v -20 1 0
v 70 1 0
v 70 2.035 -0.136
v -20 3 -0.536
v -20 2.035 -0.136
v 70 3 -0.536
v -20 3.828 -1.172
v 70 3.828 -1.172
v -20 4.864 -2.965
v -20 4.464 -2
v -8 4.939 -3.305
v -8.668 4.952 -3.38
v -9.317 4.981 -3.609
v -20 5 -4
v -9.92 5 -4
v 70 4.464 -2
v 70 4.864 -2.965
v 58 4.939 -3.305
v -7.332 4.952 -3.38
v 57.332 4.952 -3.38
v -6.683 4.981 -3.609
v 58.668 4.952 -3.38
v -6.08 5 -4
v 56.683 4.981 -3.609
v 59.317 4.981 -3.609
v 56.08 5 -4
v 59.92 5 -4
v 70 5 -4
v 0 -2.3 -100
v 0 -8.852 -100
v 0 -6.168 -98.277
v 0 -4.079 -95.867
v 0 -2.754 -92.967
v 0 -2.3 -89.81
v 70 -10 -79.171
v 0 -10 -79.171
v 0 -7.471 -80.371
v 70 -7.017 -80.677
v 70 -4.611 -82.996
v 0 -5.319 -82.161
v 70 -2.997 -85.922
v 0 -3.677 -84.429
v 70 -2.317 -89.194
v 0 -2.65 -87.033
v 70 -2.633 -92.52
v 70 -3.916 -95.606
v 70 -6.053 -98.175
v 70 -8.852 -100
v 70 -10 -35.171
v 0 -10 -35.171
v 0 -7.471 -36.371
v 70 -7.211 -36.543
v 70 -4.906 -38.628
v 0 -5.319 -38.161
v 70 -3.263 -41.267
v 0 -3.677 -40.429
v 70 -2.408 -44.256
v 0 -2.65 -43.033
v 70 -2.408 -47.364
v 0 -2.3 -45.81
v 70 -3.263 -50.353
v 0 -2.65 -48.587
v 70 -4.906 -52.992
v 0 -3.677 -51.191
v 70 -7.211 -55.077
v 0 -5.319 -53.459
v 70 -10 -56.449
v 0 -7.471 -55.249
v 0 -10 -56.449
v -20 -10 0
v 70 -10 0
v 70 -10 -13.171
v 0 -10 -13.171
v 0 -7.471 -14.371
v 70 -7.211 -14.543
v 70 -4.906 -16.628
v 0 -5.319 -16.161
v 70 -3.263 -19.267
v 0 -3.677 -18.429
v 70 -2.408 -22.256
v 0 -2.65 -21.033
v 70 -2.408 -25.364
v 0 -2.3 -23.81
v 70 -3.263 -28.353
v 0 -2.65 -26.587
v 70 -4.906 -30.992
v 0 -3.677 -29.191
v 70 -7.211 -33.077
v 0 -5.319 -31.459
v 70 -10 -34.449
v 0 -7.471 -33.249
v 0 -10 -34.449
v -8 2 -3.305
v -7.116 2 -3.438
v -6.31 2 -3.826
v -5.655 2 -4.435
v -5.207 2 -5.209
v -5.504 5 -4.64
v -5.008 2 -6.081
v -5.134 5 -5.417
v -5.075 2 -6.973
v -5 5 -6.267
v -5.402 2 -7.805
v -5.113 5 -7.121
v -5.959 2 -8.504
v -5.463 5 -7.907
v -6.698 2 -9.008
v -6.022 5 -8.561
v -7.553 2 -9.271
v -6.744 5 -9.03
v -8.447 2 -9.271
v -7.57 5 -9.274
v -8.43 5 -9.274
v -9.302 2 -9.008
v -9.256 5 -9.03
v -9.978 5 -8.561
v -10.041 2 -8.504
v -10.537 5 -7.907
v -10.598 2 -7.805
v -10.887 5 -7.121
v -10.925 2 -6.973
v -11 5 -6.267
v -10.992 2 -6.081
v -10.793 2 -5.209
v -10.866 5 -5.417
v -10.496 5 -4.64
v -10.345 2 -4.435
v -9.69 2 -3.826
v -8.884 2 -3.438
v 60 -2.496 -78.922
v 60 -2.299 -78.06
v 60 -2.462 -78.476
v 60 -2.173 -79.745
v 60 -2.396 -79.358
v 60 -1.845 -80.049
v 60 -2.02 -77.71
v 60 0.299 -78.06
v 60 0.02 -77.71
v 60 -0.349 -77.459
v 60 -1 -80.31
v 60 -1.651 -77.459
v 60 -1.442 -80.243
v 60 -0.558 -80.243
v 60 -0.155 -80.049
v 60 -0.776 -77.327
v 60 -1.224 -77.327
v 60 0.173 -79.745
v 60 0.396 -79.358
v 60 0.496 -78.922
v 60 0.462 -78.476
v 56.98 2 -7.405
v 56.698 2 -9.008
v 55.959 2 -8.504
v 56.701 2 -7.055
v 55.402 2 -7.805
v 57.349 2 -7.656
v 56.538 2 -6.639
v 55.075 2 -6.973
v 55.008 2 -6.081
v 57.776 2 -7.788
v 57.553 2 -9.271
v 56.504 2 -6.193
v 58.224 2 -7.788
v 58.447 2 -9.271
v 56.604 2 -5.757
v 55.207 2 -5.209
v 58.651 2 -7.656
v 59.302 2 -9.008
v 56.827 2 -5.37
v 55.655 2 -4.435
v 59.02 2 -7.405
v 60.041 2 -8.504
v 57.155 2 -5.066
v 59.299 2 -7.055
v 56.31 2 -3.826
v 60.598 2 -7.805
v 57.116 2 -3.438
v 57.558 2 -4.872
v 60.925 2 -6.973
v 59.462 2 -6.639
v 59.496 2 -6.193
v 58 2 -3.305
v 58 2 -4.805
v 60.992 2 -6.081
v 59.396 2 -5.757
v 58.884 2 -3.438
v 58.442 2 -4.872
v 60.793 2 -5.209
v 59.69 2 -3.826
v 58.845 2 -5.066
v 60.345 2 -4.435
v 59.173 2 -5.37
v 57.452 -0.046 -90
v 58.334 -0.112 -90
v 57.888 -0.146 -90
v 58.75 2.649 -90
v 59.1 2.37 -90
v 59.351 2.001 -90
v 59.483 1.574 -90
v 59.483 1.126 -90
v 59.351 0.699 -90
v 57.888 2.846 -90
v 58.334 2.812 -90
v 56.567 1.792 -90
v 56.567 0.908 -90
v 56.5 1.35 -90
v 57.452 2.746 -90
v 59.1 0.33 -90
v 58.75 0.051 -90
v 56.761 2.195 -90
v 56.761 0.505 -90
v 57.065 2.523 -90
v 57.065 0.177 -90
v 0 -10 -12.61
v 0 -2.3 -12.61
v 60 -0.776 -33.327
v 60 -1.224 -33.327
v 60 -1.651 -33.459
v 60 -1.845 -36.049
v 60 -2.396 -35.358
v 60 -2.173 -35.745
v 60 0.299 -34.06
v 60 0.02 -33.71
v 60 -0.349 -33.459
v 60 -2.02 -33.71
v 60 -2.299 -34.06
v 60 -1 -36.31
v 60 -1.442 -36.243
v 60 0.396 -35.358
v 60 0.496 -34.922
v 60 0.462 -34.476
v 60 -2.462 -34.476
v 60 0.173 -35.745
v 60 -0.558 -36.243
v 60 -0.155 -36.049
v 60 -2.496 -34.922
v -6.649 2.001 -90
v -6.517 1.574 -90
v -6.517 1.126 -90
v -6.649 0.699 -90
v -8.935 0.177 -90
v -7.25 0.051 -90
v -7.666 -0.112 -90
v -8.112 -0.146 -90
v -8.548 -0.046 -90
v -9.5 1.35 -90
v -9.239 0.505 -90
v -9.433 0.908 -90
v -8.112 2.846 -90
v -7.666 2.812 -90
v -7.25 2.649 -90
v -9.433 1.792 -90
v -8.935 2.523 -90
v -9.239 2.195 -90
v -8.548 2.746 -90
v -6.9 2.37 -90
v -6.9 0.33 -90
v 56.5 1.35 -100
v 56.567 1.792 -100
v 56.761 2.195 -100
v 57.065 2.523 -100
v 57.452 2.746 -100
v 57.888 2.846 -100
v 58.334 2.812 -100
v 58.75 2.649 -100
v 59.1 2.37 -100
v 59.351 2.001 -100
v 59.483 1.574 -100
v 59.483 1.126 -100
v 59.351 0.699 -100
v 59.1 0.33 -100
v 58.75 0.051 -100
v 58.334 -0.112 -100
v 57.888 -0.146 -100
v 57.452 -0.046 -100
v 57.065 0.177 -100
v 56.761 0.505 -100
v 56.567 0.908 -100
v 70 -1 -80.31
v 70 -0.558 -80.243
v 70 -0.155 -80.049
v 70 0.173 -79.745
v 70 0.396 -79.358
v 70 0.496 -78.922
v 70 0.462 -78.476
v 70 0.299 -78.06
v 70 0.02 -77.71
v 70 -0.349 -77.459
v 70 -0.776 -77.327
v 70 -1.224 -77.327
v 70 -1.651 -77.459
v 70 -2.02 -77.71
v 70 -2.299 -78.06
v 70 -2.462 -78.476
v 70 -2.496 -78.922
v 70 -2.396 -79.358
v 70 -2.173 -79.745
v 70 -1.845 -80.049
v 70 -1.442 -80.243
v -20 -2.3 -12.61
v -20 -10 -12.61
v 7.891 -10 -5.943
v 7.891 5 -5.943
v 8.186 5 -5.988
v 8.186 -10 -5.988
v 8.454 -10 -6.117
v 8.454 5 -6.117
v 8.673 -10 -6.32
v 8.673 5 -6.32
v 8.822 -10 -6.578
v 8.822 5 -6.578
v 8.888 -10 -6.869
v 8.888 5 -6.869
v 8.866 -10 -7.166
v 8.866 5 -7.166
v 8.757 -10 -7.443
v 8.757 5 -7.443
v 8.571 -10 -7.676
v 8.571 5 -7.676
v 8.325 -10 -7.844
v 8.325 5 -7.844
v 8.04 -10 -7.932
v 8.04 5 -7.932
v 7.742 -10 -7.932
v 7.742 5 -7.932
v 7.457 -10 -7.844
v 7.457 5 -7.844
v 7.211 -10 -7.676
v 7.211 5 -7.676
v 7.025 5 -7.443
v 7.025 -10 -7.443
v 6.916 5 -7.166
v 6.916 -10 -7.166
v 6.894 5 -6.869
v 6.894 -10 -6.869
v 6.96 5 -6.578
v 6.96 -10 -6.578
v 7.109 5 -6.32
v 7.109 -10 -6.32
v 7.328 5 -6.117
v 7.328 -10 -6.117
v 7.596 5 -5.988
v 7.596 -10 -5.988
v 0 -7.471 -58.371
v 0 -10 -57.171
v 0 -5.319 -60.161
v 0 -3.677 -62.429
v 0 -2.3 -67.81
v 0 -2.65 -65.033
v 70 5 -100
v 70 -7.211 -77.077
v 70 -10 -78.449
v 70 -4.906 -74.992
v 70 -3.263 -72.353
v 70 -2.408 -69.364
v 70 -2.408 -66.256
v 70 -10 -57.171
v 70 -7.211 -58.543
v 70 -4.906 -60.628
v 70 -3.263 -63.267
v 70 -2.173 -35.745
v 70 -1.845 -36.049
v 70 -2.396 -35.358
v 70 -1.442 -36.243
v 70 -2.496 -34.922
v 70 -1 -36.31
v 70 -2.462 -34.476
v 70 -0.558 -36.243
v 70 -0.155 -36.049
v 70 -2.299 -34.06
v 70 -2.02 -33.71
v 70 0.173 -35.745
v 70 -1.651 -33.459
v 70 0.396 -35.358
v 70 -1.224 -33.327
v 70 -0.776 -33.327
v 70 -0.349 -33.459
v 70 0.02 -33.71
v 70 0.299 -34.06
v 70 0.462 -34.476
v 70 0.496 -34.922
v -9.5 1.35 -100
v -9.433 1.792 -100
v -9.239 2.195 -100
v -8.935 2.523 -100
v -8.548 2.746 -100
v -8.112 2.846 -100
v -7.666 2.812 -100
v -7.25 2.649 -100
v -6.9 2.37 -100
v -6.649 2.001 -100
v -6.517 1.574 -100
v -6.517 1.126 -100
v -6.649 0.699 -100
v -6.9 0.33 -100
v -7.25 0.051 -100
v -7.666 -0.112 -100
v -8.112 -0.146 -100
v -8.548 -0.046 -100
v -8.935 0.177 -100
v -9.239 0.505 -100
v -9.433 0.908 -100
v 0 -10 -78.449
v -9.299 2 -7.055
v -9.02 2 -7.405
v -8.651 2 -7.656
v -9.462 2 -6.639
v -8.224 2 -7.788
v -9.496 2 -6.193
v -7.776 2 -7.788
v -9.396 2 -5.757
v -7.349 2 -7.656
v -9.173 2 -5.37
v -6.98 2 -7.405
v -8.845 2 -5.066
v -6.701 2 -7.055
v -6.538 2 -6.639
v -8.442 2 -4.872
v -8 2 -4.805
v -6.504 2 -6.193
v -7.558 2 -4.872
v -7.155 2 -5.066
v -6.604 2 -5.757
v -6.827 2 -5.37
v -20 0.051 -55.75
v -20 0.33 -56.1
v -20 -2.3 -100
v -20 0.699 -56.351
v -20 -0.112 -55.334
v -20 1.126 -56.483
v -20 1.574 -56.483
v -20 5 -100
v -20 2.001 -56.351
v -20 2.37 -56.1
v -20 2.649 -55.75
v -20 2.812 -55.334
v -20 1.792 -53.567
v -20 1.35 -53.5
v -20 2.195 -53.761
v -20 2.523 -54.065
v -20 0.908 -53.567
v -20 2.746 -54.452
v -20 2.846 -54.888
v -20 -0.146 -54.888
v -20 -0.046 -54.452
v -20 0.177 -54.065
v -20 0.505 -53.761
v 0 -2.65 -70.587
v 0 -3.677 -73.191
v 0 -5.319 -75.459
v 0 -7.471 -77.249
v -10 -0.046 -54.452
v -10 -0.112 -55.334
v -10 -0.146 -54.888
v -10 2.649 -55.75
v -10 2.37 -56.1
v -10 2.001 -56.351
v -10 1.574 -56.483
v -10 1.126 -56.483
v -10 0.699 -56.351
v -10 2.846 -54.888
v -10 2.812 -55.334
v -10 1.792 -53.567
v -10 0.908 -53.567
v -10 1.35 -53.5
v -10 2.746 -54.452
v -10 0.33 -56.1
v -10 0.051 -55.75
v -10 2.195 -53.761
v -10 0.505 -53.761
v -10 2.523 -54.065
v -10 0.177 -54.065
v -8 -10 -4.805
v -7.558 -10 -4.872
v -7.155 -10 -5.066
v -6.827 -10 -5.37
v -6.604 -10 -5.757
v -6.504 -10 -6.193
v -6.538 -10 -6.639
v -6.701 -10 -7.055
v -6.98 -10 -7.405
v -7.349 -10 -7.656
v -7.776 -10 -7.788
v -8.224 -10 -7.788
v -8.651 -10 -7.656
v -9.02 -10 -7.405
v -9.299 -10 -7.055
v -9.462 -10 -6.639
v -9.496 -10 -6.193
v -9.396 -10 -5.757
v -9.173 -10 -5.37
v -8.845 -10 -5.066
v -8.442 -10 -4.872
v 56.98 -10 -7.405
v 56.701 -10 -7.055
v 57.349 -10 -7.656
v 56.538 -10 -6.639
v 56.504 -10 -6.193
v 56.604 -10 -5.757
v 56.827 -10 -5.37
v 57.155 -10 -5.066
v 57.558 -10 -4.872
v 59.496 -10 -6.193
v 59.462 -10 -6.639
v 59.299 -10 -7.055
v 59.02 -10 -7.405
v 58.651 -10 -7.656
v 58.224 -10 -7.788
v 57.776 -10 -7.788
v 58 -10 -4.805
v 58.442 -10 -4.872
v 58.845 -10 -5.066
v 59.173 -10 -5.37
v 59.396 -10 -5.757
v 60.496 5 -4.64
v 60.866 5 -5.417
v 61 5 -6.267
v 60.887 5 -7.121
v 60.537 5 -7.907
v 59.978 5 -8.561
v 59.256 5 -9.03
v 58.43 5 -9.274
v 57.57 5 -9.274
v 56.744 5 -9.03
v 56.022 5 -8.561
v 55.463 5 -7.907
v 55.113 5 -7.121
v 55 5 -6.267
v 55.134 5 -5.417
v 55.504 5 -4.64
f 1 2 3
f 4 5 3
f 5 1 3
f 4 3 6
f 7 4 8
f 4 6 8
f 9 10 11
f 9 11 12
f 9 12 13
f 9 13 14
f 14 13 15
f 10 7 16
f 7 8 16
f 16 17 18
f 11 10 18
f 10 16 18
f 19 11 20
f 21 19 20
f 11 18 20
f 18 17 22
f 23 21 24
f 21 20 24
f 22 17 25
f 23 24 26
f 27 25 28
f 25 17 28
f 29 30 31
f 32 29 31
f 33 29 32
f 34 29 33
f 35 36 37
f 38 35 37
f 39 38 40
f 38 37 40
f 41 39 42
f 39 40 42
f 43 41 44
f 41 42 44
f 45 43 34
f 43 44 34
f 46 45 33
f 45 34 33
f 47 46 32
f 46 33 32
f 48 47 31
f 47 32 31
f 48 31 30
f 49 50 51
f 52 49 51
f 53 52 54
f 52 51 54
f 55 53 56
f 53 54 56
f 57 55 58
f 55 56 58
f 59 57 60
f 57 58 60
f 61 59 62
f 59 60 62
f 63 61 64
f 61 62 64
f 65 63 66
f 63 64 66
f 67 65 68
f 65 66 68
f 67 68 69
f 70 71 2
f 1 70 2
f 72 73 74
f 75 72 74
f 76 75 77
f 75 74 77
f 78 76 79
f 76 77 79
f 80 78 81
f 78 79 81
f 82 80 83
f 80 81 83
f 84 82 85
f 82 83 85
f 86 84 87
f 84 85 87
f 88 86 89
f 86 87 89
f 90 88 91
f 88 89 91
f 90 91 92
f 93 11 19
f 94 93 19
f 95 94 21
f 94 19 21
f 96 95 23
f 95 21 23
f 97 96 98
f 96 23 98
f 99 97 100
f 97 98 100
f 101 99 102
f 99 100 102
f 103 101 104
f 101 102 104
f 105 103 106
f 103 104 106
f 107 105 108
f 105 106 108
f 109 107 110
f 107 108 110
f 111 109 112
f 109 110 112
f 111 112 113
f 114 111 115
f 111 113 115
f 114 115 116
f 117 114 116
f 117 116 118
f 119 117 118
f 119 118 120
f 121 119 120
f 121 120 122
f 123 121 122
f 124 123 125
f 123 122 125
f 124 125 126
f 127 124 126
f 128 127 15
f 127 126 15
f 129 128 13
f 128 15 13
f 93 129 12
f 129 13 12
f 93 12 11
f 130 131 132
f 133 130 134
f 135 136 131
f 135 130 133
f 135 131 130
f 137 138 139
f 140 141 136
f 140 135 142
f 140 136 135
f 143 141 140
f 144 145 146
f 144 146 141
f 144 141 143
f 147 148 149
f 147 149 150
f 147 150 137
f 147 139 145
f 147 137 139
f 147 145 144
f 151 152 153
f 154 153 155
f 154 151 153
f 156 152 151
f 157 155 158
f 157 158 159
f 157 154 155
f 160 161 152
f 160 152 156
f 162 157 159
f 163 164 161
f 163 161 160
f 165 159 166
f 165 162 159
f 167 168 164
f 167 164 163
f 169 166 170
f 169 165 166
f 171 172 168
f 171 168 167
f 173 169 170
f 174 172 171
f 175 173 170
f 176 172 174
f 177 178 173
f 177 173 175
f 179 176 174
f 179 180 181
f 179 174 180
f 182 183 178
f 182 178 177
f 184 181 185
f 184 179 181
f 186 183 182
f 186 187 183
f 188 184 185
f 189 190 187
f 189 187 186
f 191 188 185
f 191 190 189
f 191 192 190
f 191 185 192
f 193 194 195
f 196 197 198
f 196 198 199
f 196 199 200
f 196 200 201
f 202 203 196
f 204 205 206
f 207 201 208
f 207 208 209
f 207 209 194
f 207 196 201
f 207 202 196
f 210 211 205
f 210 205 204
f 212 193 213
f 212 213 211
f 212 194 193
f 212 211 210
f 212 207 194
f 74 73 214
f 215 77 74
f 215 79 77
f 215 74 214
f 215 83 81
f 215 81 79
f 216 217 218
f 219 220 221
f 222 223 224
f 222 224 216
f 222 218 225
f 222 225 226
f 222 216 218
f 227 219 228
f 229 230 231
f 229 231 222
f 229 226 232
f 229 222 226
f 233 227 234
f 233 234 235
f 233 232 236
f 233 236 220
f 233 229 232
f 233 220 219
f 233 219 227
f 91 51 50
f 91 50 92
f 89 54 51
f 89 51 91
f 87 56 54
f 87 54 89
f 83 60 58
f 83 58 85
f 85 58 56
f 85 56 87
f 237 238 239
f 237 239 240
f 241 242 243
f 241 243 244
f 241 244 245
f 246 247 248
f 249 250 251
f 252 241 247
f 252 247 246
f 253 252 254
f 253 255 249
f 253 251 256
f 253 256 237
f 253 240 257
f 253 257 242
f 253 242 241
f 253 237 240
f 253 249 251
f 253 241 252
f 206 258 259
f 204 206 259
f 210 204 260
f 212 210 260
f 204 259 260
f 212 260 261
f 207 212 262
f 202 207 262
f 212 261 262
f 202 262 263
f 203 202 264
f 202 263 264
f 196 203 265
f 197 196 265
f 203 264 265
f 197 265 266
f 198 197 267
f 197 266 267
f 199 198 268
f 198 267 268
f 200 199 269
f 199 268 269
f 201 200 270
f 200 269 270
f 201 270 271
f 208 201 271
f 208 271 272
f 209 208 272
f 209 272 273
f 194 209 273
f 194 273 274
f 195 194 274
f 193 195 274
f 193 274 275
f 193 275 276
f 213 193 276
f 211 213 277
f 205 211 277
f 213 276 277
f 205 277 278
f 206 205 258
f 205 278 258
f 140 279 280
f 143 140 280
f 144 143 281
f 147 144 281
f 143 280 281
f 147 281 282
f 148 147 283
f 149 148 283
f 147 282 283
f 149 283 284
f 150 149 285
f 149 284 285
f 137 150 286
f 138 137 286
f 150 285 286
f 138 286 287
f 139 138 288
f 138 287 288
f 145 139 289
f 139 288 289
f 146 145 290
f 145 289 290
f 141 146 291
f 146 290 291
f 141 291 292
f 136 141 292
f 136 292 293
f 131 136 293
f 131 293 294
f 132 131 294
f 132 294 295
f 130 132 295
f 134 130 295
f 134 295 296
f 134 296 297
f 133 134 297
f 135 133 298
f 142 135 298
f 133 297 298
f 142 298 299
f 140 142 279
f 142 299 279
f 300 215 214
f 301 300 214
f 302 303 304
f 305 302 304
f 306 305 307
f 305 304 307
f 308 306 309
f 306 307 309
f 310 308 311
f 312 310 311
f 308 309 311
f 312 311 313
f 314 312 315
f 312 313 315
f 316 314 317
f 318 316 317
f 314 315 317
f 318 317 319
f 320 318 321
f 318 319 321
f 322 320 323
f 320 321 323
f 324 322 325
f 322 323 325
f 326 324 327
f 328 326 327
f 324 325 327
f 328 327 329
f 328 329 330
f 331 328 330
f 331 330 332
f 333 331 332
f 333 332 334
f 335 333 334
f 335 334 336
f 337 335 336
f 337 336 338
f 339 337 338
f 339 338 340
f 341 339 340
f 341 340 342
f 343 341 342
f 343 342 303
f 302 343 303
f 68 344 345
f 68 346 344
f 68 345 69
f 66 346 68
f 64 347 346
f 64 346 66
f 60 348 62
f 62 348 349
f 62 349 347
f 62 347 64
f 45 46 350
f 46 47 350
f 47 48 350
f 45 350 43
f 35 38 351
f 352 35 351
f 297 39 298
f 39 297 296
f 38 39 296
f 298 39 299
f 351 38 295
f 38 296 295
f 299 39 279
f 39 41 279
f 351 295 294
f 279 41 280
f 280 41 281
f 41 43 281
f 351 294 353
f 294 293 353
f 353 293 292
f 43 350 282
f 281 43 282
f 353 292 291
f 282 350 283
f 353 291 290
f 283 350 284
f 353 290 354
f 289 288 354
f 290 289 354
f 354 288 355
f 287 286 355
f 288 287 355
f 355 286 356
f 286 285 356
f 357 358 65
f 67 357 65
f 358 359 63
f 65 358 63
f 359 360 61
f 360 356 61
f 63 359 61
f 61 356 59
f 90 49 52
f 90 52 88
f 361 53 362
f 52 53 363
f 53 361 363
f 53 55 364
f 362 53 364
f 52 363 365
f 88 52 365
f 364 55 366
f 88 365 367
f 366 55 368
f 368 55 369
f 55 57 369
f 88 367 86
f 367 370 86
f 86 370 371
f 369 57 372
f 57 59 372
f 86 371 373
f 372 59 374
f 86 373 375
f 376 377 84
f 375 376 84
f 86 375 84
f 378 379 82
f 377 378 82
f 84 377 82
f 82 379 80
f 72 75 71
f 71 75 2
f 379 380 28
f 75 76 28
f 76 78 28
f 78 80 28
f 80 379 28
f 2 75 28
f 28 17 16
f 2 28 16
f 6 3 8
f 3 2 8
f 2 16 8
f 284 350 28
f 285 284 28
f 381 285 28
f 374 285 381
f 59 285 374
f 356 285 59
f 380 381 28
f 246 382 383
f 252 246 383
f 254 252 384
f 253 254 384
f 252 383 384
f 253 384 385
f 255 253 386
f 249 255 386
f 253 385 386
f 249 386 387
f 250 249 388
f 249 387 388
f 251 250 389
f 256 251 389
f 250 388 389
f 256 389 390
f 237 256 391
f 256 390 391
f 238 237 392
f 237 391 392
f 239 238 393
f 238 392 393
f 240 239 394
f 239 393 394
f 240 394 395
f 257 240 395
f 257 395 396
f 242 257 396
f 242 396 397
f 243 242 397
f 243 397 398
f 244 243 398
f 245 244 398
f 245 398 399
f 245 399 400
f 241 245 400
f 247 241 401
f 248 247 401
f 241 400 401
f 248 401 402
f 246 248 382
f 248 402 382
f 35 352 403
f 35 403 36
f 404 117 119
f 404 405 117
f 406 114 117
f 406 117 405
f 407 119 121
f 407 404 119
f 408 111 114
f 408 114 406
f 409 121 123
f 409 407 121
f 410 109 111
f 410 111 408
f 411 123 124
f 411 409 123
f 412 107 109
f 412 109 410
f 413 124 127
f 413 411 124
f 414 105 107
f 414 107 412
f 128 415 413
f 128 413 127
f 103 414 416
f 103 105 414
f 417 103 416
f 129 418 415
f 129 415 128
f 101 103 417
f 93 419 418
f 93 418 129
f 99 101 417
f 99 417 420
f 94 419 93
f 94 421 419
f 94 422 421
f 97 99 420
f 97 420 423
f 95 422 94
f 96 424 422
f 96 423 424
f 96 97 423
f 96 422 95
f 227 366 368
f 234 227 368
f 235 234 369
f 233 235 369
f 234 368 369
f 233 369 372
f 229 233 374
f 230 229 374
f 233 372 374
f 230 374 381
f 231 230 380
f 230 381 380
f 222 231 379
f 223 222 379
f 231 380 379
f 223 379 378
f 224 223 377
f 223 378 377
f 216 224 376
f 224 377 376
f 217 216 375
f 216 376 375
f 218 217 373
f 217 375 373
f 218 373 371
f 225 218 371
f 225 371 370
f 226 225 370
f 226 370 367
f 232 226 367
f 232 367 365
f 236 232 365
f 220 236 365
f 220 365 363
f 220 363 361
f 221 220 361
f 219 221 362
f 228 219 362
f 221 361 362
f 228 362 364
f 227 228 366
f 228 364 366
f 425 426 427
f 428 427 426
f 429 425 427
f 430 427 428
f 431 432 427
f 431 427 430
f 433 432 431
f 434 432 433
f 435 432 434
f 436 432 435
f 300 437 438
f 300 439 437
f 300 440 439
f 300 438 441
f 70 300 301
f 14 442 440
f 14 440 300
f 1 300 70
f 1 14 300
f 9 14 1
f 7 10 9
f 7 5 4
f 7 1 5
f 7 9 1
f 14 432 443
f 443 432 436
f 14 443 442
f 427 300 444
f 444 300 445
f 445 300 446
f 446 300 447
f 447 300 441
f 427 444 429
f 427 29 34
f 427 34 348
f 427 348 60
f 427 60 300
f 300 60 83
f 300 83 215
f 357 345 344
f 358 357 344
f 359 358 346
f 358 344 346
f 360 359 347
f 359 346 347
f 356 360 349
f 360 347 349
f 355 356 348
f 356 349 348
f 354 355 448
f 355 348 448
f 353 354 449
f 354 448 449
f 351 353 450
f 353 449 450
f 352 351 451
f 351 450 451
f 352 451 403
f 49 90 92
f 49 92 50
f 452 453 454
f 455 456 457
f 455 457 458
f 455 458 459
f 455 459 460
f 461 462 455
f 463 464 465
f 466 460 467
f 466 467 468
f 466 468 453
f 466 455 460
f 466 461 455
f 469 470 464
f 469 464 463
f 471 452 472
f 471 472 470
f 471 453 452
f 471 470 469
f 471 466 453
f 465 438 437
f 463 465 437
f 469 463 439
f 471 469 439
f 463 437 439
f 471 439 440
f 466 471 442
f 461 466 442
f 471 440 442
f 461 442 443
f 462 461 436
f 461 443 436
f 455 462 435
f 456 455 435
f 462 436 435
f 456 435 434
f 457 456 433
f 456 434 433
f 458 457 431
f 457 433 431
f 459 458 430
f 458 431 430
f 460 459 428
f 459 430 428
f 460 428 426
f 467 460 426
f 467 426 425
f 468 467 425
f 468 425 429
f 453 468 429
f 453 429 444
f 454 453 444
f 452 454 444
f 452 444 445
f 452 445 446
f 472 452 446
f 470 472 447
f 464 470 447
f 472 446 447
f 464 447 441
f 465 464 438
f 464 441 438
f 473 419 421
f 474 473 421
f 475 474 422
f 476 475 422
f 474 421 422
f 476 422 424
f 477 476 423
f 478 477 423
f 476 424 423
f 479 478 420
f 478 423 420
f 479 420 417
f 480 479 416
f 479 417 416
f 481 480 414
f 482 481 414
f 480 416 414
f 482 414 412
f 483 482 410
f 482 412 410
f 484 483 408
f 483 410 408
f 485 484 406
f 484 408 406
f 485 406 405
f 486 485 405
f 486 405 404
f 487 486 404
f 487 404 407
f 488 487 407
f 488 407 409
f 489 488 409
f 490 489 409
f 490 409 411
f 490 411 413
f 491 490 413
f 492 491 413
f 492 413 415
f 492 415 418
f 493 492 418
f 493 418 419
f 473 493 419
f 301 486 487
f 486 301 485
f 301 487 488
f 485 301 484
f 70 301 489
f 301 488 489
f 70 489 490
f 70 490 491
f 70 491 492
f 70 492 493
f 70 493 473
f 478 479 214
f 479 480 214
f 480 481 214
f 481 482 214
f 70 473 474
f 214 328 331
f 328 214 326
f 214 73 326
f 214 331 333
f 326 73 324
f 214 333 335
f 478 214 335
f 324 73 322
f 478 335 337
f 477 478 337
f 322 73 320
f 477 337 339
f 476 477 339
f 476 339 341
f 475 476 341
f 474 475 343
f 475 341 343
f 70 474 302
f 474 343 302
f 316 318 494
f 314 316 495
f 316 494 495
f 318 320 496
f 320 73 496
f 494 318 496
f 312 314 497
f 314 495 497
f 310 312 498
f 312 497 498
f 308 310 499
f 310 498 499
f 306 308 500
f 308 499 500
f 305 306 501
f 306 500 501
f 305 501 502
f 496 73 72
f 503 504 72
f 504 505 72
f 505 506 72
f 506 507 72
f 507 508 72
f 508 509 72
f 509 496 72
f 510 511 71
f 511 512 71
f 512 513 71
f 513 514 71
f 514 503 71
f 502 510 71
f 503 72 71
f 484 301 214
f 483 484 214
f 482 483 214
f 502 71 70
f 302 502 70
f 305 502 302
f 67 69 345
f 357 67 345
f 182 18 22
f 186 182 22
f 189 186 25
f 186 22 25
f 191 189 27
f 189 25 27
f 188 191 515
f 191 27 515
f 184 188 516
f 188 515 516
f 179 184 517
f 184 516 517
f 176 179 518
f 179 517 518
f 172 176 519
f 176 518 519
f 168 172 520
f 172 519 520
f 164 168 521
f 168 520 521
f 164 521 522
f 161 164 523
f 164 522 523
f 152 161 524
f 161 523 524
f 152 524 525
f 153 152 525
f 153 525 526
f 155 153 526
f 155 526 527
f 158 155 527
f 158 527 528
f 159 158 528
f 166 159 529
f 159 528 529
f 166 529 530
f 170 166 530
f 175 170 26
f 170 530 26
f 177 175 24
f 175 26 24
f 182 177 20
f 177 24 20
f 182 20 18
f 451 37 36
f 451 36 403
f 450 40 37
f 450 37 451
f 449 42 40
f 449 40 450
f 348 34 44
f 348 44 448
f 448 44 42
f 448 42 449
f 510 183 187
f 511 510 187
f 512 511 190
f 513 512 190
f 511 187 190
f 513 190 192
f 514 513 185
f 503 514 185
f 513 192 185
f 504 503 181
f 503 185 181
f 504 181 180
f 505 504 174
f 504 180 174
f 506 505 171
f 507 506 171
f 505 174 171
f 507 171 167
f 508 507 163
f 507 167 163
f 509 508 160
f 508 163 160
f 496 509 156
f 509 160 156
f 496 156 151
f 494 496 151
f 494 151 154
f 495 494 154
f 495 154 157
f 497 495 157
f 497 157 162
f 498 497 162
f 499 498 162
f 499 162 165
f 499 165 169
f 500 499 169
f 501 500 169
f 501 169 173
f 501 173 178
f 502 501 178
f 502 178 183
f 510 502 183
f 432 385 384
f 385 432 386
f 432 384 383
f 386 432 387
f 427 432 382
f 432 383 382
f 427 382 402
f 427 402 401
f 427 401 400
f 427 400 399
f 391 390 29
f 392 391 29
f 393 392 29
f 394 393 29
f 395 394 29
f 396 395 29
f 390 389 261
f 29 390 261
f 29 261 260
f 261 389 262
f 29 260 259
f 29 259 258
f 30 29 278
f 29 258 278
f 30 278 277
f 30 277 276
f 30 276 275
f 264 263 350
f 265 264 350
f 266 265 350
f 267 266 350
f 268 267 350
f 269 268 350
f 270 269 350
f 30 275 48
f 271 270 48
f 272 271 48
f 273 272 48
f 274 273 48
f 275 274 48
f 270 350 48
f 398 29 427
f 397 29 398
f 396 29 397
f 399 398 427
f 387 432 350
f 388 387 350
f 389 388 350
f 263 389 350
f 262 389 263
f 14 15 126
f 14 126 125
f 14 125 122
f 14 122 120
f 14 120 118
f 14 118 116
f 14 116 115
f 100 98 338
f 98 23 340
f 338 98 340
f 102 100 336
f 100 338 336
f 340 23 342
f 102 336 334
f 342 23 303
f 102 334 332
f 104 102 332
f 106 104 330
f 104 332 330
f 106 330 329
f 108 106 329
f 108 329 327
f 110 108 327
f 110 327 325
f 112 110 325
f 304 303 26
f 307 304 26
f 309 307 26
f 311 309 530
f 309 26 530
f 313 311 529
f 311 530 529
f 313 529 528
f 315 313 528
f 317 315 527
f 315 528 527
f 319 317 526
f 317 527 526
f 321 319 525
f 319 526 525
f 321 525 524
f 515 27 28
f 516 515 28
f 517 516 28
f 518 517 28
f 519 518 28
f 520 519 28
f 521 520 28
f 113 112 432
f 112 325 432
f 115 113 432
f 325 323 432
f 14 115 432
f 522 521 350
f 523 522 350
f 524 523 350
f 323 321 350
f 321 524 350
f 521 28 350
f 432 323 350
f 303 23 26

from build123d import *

# Parameters (mm, degrees)
SKETCH_1_W          = 70
SKETCH_1_H          = 110
EXTRUDE_1_DEPTH     = 5
EXTRUDE_2_DEPTH     = 70
CUT_EXTRUDE_1_DEPTH = 70
SKETCH_4_W          = 12.81
SKETCH_4_H          = 10
EXTRUDE_3_DEPTH     = 70
SKETCH_5_W          = 10
SKETCH_5_H          = 15
CUT_EXTRUDE_2_DEPTH = 70
CUT_EXTRUDE_3_REACH = 124.474
SKETCH_6_R          = 11.2
SKETCH_7_R          = 1.5
CUT_EXTRUDE_4_DEPTH = 10
EXTRUDE_4_DEPTH     = 20
SKETCH_9_R          = 1.5
CUT_EXTRUDE_5_DEPTH = 10
CUT_EXTRUDE_6_REACH = 124.984
SKETCH_10_R         = 1.5
SKETCH_11_R         = 3
CUT_EXTRUDE_7_DEPTH = 3
CUT_EXTRUDE_8_REACH = 124.984
SKETCH_12_R         = 1
FILLET_1_R          = 4
SKETCH_13_R         = 1.5
CUT_EXTRUDE_9_DEPTH = 10


with BuildPart() as part:
    # 草图1 → 凸台-拉伸1 (new body)
    with BuildSketch(Plane(origin=(0, 0, 0), x_dir=(1, 0, 0), z_dir=(0, 1, 0))):
        with Locations((35, 55)):
            Rectangle(SKETCH_1_W, SKETCH_1_H)
    extrude(amount=EXTRUDE_1_DEPTH)

    # 草图2 → 凸台-拉伸2 (add)
    with BuildSketch(Plane.ZY):
        with BuildLine():
            Line((-110, -13.499982039), (-100.81, -13.499982039))
            ThreePointArc((-100.81, -13.499982039), (-89.81, -2.499982039), (-78.81, -13.499982039))
            ThreePointArc((-78.81, -13.499982039), (-67.81, -2.499982039), (-56.81, -13.499982039))
            ThreePointArc((-56.81, -13.499982039), (-45.81, -2.499982039), (-34.81, -13.499982039))
            ThreePointArc((-34.81, -13.499982039), (-23.81, -2.499982039), (-12.81, -13.499982039))
            Line((-12.81, -13.499982039), (-12.81, 0))
            Line((-12.81, 0), (-110, 0))
            Line((-110, 0), (-110, -13.499982039))
        make_face()
    extrude(amount=-EXTRUDE_2_DEPTH)

    # 草图3 → 切除-拉伸1 (cut)
    with BuildSketch(Plane.ZY):
        with BuildLine():
            Line((-100.238332835, -10), (-110, -10))
            Line((-110, -10), (-110, -13.499982039))
            Line((-110, -13.499982039), (-100.81, -13.499982039))
            ThreePointArc((-100.81, -13.499982039), (-100.666142528, -11.726801449), (-100.238332835, -10))
        make_face()
        with BuildLine():
            Line((-78.238332835, -10), (-79.381667165, -10))
            ThreePointArc((-79.381667165, -10), (-78.953857472, -11.726801449), (-78.81, -13.499982039))
            ThreePointArc((-78.81, -13.499982039), (-78.666142528, -11.726801449), (-78.238332835, -10))
        make_face()
        with BuildLine():
            Line((-56.238332835, -10), (-57.381667165, -10))
            ThreePointArc((-57.381667165, -10), (-56.953857472, -11.726801449), (-56.81, -13.499982039))
            ThreePointArc((-56.81, -13.499982039), (-56.666142528, -11.726801449), (-56.238332835, -10))
        make_face()
        with BuildLine():
            Line((-12.81, -13.499982039), (-12.81, -10))
            Line((-12.81, -10), (-13.381667165, -10))
            ThreePointArc((-13.381667165, -10), (-12.953857472, -11.726801449), (-12.81, -13.499982039))
        make_face()
        with BuildLine():
            Line((-34.238332835, -10), (-35.381667165, -10))
            ThreePointArc((-35.381667165, -10), (-34.953857472, -11.726801449), (-34.81, -13.499982039))
            ThreePointArc((-34.81, -13.499982039), (-34.666142528, -11.726801449), (-34.238332835, -10))
        make_face()
    extrude(amount=-CUT_EXTRUDE_1_DEPTH, mode=Mode.SUBTRACT)

    # 草图4 → 凸台-拉伸3 (add)
    with BuildSketch(Plane.ZY):
        with Locations((-6.405, -5)):
            Rectangle(SKETCH_4_W, SKETCH_4_H)
    extrude(amount=-EXTRUDE_3_DEPTH)

    # 草图5 → 切除-拉伸2 (cut)
    with BuildSketch(Plane.ZY):
        with Locations((-105, -2.5)):
            Rectangle(SKETCH_5_W, SKETCH_5_H)
    extrude(amount=-CUT_EXTRUDE_2_DEPTH, mode=Mode.SUBTRACT)

    # 草图6 → 切除-拉伸3 (cut, up to next)
    with BuildSketch(Plane.ZY, mode=Mode.PRIVATE) as cut_extrude_3_sk1:
        with Locations((-89.81, -13.499982039)):
            Circle(SKETCH_6_R)
    cut_extrude_3_tool1 = extrude(cut_extrude_3_sk1.sketch, amount=-CUT_EXTRUDE_3_REACH, mode=Mode.PRIVATE) & part.part
    # 草图6 → 切除-拉伸3 (cut, up to next)
    with BuildSketch(Plane.ZY, mode=Mode.PRIVATE) as cut_extrude_3_sk2:
        with Locations((-67.81, -13.499982039)):
            Circle(SKETCH_6_R)
    cut_extrude_3_tool2 = extrude(cut_extrude_3_sk2.sketch, amount=-CUT_EXTRUDE_3_REACH, mode=Mode.PRIVATE) & part.part
    # 草图6 → 切除-拉伸3 (cut, up to next)
    with BuildSketch(Plane.ZY, mode=Mode.PRIVATE) as cut_extrude_3_sk3:
        with Locations((-45.81, -13.499982039)):
            Circle(SKETCH_6_R)
    cut_extrude_3_tool3 = extrude(cut_extrude_3_sk3.sketch, amount=-CUT_EXTRUDE_3_REACH, mode=Mode.PRIVATE) & part.part
    # 草图6 → 切除-拉伸3 (cut, up to next)
    with BuildSketch(Plane.ZY, mode=Mode.PRIVATE) as cut_extrude_3_sk4:
        with Locations((-23.81, -13.499982039)):
            Circle(SKETCH_6_R)
    cut_extrude_3_tool4 = extrude(cut_extrude_3_sk4.sketch, amount=-CUT_EXTRUDE_3_REACH, mode=Mode.PRIVATE) & part.part
    add(cut_extrude_3_tool1.solids().sort_by_distance((0, -13.499982, -89.81))[0], mode=Mode.SUBTRACT)
    add(cut_extrude_3_tool2.solids().sort_by_distance((0, -13.499982, -67.81))[0], mode=Mode.SUBTRACT)
    add(cut_extrude_3_tool3.solids().sort_by_distance((0, -13.499982, -45.81))[0], mode=Mode.SUBTRACT)
    add(cut_extrude_3_tool4.solids().sort_by_distance((0, -13.499982, -23.81))[0], mode=Mode.SUBTRACT)

    # 草图7 → 切除-拉伸4 (cut)
    with BuildSketch(Plane(origin=(70, 0, 0), x_dir=(0, 0, -1), z_dir=(1, 0, 0))):
        with Locations((78.81000898, -1)):
            Circle(SKETCH_7_R)
        with Locations((34.81000898, -1)):
            Circle(SKETCH_7_R)
    extrude(amount=-CUT_EXTRUDE_4_DEPTH, mode=Mode.SUBTRACT)

    # 草图8 → 凸台-拉伸4 (add)
    with BuildSketch(Plane.ZY):
        Polygon((0, 5), (-100, 5), (-100, -2.299982039), (-12.61, -2.299982039), (-12.61, -10), (0, -10), (0, -2.299982039), align=None)
    extrude(amount=EXTRUDE_4_DEPTH)

    # 草图9 → 切除-拉伸5 (cut)
    with BuildSketch(Plane(origin=(0, 0, -100), x_dir=(-1, 0, 0), z_dir=(0, 0, -1))):
        with Locations((-58, 1.35000898)):
            Circle(SKETCH_9_R)
        with Locations((8, 1.35000898)):
            Circle(SKETCH_9_R)
    extrude(amount=-CUT_EXTRUDE_5_DEPTH, mode=Mode.SUBTRACT)

    # 草图10 → 切除-拉伸6 (cut, up to next)
    with BuildSketch(Plane(origin=(0, 5, 0), x_dir=(1, 0, 0), z_dir=(0, 1, 0)), mode=Mode.PRIVATE) as cut_extrude_6_sk1:
        with Locations(Location((-8, 6.305, 0), (0, 0, 270))):
            Circle(SKETCH_10_R)
    cut_extrude_6_tool1 = extrude(cut_extrude_6_sk1.sketch, amount=-CUT_EXTRUDE_6_REACH, mode=Mode.PRIVATE) & part.part
    # 草图10 → 切除-拉伸6 (cut, up to next)
    with BuildSketch(Plane(origin=(0, 5, 0), x_dir=(1, 0, 0), z_dir=(0, 1, 0)), mode=Mode.PRIVATE) as cut_extrude_6_sk2:
        with Locations(Location((58, 6.305, 0), (0, 0, 270))):
            Circle(SKETCH_10_R)
    cut_extrude_6_tool2 = extrude(cut_extrude_6_sk2.sketch, amount=-CUT_EXTRUDE_6_REACH, mode=Mode.PRIVATE) & part.part
    add(cut_extrude_6_tool1.solids().sort_by_distance((-8, 5, -6.305))[0], mode=Mode.SUBTRACT)
    add(cut_extrude_6_tool2.solids().sort_by_distance((58, 5, -6.305))[0], mode=Mode.SUBTRACT)

    # 草图11 → 切除-拉伸7 (cut)
    with BuildSketch(Plane(origin=(0, 5, 0), x_dir=(1, 0, 0), z_dir=(0, 1, 0))):
        with Locations(Location((-8, 6.305, 0), (0, 0, 270))):
            Circle(SKETCH_11_R)
        with Locations(Location((58, 6.305, 0), (0, 0, 270))):
            Circle(SKETCH_11_R)
    extrude(amount=-CUT_EXTRUDE_7_DEPTH, mode=Mode.SUBTRACT)

    # 草图12 → 切除-拉伸8 (cut, up to next)
    with BuildSketch(Plane(origin=(0, 5, 0), x_dir=(1, 0, 0), z_dir=(0, 1, 0)), mode=Mode.PRIVATE) as cut_extrude_8_sk1:
        with Locations(Location((7.891, 6.943325734, 0), (0, 0, 270))):
            Circle(SKETCH_12_R)
    cut_extrude_8_tool1 = extrude(cut_extrude_8_sk1.sketch, amount=-CUT_EXTRUDE_8_REACH, mode=Mode.PRIVATE) & part.part
    add(cut_extrude_8_tool1.solids().sort_by_distance((7.891, 5, -6.943326))[0], mode=Mode.SUBTRACT)

    # 圆角1
    # the kernel refuses this fillet: 4 mm, written as the material it takes off along each edge
    with BuildSketch(Plane(origin=(80, 5, 0), x_dir=(0, -1, 0), z_dir=(-1, 0, 0))) as fillet_1_piece_1:
        with BuildLine():
            CenterArc((FILLET_1_R, -FILLET_1_R), FILLET_1_R, 90, 90)
            Line((0, -FILLET_1_R), (0, 0))
            Line((0, 0), (FILLET_1_R, 0))
        make_face()
    extrude(amount=110, mode=Mode.SUBTRACT)

    # 草图13 → 切除-拉伸9 (cut)
    with BuildSketch(Plane.ZY.offset(20)):
        with Locations((-55, 1.35000898)):
            Circle(SKETCH_13_R)
    extrude(amount=-CUT_EXTRUDE_9_DEPTH, mode=Mode.SUBTRACT)


solid = part.part
